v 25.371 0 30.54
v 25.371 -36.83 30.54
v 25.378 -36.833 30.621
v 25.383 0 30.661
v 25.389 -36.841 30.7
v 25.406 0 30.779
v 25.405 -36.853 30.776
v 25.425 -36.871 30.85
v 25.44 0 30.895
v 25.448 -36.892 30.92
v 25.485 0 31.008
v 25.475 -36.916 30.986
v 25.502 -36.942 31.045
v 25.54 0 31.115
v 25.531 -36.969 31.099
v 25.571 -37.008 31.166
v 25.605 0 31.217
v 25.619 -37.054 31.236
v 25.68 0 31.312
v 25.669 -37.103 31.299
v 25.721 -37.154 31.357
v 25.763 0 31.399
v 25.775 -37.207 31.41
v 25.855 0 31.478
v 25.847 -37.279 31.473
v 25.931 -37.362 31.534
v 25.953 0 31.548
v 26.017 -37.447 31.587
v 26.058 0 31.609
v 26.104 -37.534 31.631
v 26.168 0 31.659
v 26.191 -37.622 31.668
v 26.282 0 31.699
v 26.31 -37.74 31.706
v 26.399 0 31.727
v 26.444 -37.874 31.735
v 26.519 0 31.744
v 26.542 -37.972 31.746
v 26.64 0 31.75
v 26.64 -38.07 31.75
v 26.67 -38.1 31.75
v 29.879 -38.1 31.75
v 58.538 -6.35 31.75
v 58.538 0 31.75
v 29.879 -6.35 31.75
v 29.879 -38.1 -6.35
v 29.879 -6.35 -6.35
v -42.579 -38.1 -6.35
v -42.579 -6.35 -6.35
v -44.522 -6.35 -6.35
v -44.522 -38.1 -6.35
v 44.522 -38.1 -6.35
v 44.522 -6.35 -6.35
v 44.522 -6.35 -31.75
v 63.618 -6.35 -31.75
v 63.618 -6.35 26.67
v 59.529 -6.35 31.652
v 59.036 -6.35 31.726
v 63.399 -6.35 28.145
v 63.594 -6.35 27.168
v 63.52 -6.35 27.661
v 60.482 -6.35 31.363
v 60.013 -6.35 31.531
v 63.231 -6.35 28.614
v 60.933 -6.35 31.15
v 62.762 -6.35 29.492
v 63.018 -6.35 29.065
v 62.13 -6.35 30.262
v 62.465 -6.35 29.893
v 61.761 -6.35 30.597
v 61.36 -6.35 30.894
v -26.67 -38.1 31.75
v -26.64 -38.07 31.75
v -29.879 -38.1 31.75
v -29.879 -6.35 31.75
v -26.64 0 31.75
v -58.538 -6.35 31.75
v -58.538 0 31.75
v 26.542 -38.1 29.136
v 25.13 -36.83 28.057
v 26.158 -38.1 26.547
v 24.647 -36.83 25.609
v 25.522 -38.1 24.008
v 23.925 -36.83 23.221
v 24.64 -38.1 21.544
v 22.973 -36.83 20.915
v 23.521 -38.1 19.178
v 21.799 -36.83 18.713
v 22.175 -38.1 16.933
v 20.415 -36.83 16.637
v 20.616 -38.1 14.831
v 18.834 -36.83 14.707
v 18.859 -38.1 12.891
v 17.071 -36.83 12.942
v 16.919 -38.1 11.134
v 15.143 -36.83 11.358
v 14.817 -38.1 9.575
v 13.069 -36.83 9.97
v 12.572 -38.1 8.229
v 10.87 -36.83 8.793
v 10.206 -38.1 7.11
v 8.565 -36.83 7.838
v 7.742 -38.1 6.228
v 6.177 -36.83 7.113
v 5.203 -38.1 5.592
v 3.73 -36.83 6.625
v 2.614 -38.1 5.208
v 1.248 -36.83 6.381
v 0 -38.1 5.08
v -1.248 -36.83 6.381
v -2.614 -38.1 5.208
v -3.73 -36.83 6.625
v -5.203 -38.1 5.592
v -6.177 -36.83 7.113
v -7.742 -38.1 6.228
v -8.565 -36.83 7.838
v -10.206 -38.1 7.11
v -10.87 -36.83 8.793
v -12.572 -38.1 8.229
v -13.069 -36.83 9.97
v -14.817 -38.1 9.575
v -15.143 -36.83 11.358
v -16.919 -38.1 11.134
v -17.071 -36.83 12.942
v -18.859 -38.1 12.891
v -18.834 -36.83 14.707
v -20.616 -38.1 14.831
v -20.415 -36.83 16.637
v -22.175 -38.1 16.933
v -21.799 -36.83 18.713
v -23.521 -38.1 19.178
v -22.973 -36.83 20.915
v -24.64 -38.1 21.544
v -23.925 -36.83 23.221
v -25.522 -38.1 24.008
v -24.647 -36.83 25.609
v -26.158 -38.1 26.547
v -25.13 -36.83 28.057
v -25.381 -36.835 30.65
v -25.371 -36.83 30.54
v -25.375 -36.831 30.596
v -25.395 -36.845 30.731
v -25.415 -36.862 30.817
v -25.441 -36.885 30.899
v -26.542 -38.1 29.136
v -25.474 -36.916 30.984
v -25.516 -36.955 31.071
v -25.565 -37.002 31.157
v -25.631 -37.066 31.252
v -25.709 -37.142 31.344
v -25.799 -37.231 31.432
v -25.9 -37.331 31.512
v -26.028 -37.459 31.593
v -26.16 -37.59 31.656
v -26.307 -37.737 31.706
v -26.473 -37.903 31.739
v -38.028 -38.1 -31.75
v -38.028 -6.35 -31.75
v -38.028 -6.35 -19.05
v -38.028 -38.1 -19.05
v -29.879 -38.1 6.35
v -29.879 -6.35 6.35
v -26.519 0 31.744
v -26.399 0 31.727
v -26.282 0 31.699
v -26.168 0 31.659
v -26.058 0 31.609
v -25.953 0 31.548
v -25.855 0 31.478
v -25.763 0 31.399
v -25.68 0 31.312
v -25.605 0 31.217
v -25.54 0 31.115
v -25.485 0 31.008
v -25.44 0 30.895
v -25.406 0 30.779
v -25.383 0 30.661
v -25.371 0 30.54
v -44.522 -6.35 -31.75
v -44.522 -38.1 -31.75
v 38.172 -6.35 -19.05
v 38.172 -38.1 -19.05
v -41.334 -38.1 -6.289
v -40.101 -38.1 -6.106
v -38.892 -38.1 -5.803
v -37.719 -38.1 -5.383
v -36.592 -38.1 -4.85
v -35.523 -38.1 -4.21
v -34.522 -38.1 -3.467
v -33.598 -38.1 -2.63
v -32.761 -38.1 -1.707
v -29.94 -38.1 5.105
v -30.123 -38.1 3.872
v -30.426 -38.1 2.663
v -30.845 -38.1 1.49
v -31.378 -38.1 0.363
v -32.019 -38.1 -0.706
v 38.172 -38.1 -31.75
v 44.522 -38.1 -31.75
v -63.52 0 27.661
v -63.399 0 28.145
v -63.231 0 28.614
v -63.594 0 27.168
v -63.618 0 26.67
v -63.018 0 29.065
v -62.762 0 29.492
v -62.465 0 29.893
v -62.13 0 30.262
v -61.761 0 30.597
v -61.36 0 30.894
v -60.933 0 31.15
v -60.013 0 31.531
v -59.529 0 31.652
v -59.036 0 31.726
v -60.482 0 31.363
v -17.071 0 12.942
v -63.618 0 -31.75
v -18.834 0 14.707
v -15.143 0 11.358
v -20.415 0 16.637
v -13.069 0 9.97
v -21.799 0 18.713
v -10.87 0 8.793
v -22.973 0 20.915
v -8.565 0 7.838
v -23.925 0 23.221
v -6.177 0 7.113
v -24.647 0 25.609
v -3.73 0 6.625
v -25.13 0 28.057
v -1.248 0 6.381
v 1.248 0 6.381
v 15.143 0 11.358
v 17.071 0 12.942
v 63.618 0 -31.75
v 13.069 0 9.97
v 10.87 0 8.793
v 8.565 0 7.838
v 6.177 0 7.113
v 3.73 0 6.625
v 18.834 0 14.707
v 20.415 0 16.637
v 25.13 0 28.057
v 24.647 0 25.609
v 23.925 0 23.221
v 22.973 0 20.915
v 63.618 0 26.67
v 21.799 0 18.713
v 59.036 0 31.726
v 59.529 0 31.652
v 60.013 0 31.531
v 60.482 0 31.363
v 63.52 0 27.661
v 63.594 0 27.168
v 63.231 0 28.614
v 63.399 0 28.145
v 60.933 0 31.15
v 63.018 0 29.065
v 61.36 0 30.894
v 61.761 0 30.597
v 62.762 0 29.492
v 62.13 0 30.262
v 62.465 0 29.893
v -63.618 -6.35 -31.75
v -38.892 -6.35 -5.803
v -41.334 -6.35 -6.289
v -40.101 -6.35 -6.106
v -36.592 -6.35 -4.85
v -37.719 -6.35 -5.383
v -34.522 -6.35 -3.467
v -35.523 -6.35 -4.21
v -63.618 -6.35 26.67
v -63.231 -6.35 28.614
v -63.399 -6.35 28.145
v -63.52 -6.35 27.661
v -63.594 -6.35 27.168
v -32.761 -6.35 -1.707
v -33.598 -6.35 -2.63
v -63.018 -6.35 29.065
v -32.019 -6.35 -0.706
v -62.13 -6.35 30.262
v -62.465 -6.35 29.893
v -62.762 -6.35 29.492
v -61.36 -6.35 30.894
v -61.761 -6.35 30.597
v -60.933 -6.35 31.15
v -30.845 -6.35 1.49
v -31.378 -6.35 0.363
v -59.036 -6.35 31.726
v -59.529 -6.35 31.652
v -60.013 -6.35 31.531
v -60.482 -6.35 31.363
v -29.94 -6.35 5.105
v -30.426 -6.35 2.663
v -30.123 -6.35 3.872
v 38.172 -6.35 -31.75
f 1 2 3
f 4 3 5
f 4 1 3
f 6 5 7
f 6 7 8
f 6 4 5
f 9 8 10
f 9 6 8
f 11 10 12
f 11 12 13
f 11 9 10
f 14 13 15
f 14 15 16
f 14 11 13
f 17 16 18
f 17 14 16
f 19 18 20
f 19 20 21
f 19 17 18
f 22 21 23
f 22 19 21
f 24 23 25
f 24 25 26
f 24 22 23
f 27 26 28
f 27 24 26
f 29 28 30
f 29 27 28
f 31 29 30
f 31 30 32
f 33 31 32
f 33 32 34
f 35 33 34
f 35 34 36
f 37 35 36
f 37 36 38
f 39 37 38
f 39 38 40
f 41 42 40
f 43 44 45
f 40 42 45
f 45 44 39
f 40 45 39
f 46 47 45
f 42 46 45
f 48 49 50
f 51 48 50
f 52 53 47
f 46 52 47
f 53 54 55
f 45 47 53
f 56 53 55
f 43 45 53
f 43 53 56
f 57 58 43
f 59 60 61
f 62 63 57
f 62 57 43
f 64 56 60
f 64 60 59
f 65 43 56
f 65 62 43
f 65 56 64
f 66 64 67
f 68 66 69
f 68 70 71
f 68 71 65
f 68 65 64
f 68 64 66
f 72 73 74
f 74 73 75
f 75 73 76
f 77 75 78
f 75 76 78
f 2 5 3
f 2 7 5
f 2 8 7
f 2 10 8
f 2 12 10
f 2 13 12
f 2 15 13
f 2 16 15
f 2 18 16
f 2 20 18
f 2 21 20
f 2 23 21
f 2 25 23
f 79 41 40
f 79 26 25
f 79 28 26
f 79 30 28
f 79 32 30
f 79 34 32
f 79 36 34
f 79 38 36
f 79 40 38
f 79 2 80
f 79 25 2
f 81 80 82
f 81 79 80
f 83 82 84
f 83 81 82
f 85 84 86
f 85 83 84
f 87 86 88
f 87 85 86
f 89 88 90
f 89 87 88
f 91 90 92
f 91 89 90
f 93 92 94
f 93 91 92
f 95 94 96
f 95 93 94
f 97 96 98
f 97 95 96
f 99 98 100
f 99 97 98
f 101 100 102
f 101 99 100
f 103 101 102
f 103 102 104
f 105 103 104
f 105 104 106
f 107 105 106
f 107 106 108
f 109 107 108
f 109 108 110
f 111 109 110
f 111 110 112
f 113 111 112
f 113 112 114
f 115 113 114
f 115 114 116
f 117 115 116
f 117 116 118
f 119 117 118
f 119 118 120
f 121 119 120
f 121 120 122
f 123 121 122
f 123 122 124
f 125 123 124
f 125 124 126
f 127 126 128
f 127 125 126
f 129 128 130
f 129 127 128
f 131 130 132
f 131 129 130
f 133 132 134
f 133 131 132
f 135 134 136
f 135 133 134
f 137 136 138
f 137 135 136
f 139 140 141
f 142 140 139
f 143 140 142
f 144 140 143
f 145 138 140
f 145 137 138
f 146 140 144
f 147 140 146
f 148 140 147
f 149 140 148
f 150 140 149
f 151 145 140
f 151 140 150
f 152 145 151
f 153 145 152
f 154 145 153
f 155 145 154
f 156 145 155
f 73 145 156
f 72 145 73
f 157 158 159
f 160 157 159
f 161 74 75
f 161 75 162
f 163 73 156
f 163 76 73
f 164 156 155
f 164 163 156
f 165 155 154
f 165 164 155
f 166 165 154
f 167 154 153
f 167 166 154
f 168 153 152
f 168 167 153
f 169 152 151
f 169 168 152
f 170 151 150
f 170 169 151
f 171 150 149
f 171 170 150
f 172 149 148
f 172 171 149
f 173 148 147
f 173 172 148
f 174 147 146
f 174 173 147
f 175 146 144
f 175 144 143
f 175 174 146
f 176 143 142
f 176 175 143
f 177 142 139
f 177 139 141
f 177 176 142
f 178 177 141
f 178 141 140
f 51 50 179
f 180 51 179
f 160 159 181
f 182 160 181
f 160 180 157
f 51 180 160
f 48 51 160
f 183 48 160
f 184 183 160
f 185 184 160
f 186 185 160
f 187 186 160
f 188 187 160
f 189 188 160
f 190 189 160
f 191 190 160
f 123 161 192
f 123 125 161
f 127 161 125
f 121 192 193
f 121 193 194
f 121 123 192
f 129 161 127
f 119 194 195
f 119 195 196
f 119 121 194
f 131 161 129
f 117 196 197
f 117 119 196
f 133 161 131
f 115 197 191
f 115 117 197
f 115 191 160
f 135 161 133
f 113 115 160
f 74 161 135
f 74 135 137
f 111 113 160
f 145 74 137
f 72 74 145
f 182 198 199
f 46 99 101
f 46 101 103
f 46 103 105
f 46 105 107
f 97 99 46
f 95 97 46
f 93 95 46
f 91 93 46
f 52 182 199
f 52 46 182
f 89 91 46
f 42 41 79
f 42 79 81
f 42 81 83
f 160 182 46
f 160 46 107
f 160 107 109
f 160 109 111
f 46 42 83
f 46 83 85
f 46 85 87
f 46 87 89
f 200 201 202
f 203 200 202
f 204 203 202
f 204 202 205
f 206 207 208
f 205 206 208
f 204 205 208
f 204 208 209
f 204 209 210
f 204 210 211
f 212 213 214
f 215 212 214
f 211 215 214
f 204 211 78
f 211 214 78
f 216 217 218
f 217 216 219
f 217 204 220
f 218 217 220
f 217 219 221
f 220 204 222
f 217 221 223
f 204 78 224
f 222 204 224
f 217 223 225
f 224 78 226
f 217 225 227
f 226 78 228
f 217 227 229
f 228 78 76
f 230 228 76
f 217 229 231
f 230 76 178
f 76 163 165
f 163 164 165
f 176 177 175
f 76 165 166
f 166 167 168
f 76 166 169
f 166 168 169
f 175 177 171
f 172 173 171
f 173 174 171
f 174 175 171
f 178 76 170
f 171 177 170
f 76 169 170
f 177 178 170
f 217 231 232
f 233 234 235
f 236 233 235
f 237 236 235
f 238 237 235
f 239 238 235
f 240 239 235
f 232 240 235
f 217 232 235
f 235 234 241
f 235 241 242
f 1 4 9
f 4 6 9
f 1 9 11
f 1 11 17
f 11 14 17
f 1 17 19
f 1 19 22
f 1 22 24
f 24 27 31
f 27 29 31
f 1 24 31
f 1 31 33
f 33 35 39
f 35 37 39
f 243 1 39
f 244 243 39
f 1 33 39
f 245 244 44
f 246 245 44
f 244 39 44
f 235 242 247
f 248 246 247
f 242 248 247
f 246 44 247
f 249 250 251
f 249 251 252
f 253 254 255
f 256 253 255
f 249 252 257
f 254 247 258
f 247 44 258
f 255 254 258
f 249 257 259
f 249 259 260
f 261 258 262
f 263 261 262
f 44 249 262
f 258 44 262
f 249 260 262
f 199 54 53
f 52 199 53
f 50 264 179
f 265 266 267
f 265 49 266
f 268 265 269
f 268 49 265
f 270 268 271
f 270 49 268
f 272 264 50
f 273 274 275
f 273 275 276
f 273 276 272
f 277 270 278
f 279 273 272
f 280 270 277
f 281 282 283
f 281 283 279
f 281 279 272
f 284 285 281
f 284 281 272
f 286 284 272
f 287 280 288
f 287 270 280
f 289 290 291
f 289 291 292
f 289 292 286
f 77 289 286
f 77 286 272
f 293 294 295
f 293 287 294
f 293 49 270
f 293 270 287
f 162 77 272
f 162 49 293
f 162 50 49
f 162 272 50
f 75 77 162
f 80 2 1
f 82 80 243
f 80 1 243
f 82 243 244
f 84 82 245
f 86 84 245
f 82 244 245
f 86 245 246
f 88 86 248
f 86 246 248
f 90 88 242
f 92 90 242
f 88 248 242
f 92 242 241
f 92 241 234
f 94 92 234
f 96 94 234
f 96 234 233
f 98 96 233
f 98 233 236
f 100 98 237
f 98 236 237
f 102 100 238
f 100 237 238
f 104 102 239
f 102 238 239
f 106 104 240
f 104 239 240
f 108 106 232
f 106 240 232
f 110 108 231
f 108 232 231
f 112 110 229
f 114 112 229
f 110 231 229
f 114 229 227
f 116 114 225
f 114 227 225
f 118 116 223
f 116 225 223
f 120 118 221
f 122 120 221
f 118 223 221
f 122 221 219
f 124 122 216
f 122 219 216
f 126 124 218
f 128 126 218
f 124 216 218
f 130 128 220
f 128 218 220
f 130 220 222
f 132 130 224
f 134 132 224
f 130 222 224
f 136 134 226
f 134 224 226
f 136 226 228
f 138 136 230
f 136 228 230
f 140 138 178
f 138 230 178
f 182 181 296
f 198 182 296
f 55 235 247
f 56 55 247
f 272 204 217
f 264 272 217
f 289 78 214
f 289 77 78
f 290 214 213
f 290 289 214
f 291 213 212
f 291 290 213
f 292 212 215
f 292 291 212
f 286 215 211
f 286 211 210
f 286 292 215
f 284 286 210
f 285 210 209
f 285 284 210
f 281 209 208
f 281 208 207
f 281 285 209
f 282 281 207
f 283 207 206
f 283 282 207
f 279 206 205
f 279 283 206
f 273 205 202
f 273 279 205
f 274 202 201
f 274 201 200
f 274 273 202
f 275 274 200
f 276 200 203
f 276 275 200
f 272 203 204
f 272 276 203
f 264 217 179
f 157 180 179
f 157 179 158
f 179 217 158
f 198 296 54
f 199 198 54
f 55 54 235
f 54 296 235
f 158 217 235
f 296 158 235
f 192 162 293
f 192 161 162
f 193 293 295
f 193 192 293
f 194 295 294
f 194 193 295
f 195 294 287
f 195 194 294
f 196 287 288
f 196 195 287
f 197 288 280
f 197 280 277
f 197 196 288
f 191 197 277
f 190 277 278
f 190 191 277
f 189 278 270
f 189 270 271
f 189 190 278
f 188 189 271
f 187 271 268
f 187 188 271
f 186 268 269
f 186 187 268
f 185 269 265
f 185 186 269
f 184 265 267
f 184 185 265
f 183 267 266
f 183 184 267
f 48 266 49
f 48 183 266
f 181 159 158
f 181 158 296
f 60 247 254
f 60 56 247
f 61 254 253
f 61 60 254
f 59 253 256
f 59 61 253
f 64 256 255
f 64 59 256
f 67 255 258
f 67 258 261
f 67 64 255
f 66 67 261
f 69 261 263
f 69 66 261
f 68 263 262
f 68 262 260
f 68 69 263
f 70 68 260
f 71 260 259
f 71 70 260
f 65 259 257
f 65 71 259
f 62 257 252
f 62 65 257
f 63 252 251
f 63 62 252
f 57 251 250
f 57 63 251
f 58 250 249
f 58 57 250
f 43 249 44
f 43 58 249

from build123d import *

# Parameters (mm, degrees)
F0_W     = 76.2
F0_H     = 12.7
F1_DEPTH = 6.35
F2_DEPTH = 38.1
F3_R     = 5.08
F4_SIZE  = 1.27
F5_R     = 1.27
F6_R     = 12.7


with BuildPart() as f1:
    # F0 (on Front) → F1 (new body)
    with BuildSketch(Plane.XZ):
        Polygon((-29.878691, -6.35), (-29.878691, 31.75), (-63.618055, 31.75), (-63.618055, -31.75), (-44.521958, -31.75), (-44.521958, -19.05), (-44.521958, -6.35), (-38.028042, -6.35), align=None)
        Polygon((63.618055, -31.75), (63.618055, 31.75), (29.878691, 31.75), (29.878691, -6.35), (38.171958, -6.35), (44.521958, -6.35), (44.521958, -19.05), (44.521958, -31.75), align=None)
        with BuildLine():
            Line((29.878691, -6.35), (29.878691, 31.75))
            Line((29.878691, 31.75), (25.4, 31.75))
            ThreePointArc((25.4, 31.75), (0, 6.35), (-25.4, 31.75))
            Line((-25.4, 31.75), (-29.878691, 31.75))
            Line((-29.878691, 31.75), (-29.878691, -6.35))
            Line((-29.878691, -6.35), (-38.028042, -6.35))
            Line((-38.028042, -6.35), (-44.521958, -6.35))
            Line((-44.521958, -6.35), (-44.521958, -19.05))
            Line((-44.521958, -19.05), (-44.521958, -31.75))
            Line((-44.521958, -31.75), (-38.028042, -31.75))
            Line((-38.028042, -31.75), (-38.028042, -19.05))
            Line((-38.028042, -19.05), (38.171958, -19.05))
            Line((38.171958, -19.05), (38.171958, -31.75))
            Line((38.171958, -31.75), (44.521958, -31.75))
            Line((44.521958, -31.75), (44.521958, -19.05))
            Line((44.521958, -19.05), (44.521958, -6.35))
            Line((44.521958, -6.35), (38.171958, -6.35))
            Line((38.171958, -6.35), (29.878691, -6.35))
        make_face()
        with Locations((0.071958, -25.4)):
            Rectangle(F0_W, F0_H)
    extrude(amount=F1_DEPTH)

    # F0 (on Front) → F2 (join)
    with BuildSketch(Plane.XZ):
        with BuildLine():
            Line((29.878691, -6.35), (29.878691, 31.75))
            Line((29.878691, 31.75), (25.4, 31.75))
            ThreePointArc((25.4, 31.75), (0, 6.35), (-25.4, 31.75))
            Line((-25.4, 31.75), (-29.878691, 31.75))
            Line((-29.878691, 31.75), (-29.878691, -6.35))
            Line((-29.878691, -6.35), (-38.028042, -6.35))
            Line((-38.028042, -6.35), (-44.521958, -6.35))
            Line((-44.521958, -6.35), (-44.521958, -19.05))
            Line((-44.521958, -19.05), (-44.521958, -31.75))
            Line((-44.521958, -31.75), (-38.028042, -31.75))
            Line((-38.028042, -31.75), (-38.028042, -19.05))
            Line((-38.028042, -19.05), (38.171958, -19.05))
            Line((38.171958, -19.05), (38.171958, -31.75))
            Line((38.171958, -31.75), (44.521958, -31.75))
            Line((44.521958, -31.75), (44.521958, -19.05))
            Line((44.521958, -19.05), (44.521958, -6.35))
            Line((44.521958, -6.35), (38.171958, -6.35))
            Line((38.171958, -6.35), (29.878691, -6.35))
        make_face()
    extrude(amount=F2_DEPTH)

    # F3
    f3_edges = [f1.edges().sort_by_distance(p)[0] for p in [
        (-63.618055, -3.175, 31.75),
        (63.618055, -3.175, 31.75),
    ]]
    fillet(f3_edges, radius=F3_R)

    # F4
    f4_edges = [f1.edges().sort_by_distance(p)[0] for p in [
        (0, -38.1, 6.35),
    ]]
    chamfer(f4_edges, length=F4_SIZE)

    # F5
    f5_edges = [f1.edges().sort_by_distance(p)[0] for p in [
        (25.4, -18.415, 31.75),
        (-25.4, -18.415, 31.75),
    ]]
    fillet(f5_edges, radius=F5_R)

    # F6
    f6_edges = [f1.edges().sort_by_distance(p)[0] for p in [
        (-29.878691, -22.225, -6.35),
    ]]
    fillet(f6_edges, radius=F6_R)


solid = f1.part
